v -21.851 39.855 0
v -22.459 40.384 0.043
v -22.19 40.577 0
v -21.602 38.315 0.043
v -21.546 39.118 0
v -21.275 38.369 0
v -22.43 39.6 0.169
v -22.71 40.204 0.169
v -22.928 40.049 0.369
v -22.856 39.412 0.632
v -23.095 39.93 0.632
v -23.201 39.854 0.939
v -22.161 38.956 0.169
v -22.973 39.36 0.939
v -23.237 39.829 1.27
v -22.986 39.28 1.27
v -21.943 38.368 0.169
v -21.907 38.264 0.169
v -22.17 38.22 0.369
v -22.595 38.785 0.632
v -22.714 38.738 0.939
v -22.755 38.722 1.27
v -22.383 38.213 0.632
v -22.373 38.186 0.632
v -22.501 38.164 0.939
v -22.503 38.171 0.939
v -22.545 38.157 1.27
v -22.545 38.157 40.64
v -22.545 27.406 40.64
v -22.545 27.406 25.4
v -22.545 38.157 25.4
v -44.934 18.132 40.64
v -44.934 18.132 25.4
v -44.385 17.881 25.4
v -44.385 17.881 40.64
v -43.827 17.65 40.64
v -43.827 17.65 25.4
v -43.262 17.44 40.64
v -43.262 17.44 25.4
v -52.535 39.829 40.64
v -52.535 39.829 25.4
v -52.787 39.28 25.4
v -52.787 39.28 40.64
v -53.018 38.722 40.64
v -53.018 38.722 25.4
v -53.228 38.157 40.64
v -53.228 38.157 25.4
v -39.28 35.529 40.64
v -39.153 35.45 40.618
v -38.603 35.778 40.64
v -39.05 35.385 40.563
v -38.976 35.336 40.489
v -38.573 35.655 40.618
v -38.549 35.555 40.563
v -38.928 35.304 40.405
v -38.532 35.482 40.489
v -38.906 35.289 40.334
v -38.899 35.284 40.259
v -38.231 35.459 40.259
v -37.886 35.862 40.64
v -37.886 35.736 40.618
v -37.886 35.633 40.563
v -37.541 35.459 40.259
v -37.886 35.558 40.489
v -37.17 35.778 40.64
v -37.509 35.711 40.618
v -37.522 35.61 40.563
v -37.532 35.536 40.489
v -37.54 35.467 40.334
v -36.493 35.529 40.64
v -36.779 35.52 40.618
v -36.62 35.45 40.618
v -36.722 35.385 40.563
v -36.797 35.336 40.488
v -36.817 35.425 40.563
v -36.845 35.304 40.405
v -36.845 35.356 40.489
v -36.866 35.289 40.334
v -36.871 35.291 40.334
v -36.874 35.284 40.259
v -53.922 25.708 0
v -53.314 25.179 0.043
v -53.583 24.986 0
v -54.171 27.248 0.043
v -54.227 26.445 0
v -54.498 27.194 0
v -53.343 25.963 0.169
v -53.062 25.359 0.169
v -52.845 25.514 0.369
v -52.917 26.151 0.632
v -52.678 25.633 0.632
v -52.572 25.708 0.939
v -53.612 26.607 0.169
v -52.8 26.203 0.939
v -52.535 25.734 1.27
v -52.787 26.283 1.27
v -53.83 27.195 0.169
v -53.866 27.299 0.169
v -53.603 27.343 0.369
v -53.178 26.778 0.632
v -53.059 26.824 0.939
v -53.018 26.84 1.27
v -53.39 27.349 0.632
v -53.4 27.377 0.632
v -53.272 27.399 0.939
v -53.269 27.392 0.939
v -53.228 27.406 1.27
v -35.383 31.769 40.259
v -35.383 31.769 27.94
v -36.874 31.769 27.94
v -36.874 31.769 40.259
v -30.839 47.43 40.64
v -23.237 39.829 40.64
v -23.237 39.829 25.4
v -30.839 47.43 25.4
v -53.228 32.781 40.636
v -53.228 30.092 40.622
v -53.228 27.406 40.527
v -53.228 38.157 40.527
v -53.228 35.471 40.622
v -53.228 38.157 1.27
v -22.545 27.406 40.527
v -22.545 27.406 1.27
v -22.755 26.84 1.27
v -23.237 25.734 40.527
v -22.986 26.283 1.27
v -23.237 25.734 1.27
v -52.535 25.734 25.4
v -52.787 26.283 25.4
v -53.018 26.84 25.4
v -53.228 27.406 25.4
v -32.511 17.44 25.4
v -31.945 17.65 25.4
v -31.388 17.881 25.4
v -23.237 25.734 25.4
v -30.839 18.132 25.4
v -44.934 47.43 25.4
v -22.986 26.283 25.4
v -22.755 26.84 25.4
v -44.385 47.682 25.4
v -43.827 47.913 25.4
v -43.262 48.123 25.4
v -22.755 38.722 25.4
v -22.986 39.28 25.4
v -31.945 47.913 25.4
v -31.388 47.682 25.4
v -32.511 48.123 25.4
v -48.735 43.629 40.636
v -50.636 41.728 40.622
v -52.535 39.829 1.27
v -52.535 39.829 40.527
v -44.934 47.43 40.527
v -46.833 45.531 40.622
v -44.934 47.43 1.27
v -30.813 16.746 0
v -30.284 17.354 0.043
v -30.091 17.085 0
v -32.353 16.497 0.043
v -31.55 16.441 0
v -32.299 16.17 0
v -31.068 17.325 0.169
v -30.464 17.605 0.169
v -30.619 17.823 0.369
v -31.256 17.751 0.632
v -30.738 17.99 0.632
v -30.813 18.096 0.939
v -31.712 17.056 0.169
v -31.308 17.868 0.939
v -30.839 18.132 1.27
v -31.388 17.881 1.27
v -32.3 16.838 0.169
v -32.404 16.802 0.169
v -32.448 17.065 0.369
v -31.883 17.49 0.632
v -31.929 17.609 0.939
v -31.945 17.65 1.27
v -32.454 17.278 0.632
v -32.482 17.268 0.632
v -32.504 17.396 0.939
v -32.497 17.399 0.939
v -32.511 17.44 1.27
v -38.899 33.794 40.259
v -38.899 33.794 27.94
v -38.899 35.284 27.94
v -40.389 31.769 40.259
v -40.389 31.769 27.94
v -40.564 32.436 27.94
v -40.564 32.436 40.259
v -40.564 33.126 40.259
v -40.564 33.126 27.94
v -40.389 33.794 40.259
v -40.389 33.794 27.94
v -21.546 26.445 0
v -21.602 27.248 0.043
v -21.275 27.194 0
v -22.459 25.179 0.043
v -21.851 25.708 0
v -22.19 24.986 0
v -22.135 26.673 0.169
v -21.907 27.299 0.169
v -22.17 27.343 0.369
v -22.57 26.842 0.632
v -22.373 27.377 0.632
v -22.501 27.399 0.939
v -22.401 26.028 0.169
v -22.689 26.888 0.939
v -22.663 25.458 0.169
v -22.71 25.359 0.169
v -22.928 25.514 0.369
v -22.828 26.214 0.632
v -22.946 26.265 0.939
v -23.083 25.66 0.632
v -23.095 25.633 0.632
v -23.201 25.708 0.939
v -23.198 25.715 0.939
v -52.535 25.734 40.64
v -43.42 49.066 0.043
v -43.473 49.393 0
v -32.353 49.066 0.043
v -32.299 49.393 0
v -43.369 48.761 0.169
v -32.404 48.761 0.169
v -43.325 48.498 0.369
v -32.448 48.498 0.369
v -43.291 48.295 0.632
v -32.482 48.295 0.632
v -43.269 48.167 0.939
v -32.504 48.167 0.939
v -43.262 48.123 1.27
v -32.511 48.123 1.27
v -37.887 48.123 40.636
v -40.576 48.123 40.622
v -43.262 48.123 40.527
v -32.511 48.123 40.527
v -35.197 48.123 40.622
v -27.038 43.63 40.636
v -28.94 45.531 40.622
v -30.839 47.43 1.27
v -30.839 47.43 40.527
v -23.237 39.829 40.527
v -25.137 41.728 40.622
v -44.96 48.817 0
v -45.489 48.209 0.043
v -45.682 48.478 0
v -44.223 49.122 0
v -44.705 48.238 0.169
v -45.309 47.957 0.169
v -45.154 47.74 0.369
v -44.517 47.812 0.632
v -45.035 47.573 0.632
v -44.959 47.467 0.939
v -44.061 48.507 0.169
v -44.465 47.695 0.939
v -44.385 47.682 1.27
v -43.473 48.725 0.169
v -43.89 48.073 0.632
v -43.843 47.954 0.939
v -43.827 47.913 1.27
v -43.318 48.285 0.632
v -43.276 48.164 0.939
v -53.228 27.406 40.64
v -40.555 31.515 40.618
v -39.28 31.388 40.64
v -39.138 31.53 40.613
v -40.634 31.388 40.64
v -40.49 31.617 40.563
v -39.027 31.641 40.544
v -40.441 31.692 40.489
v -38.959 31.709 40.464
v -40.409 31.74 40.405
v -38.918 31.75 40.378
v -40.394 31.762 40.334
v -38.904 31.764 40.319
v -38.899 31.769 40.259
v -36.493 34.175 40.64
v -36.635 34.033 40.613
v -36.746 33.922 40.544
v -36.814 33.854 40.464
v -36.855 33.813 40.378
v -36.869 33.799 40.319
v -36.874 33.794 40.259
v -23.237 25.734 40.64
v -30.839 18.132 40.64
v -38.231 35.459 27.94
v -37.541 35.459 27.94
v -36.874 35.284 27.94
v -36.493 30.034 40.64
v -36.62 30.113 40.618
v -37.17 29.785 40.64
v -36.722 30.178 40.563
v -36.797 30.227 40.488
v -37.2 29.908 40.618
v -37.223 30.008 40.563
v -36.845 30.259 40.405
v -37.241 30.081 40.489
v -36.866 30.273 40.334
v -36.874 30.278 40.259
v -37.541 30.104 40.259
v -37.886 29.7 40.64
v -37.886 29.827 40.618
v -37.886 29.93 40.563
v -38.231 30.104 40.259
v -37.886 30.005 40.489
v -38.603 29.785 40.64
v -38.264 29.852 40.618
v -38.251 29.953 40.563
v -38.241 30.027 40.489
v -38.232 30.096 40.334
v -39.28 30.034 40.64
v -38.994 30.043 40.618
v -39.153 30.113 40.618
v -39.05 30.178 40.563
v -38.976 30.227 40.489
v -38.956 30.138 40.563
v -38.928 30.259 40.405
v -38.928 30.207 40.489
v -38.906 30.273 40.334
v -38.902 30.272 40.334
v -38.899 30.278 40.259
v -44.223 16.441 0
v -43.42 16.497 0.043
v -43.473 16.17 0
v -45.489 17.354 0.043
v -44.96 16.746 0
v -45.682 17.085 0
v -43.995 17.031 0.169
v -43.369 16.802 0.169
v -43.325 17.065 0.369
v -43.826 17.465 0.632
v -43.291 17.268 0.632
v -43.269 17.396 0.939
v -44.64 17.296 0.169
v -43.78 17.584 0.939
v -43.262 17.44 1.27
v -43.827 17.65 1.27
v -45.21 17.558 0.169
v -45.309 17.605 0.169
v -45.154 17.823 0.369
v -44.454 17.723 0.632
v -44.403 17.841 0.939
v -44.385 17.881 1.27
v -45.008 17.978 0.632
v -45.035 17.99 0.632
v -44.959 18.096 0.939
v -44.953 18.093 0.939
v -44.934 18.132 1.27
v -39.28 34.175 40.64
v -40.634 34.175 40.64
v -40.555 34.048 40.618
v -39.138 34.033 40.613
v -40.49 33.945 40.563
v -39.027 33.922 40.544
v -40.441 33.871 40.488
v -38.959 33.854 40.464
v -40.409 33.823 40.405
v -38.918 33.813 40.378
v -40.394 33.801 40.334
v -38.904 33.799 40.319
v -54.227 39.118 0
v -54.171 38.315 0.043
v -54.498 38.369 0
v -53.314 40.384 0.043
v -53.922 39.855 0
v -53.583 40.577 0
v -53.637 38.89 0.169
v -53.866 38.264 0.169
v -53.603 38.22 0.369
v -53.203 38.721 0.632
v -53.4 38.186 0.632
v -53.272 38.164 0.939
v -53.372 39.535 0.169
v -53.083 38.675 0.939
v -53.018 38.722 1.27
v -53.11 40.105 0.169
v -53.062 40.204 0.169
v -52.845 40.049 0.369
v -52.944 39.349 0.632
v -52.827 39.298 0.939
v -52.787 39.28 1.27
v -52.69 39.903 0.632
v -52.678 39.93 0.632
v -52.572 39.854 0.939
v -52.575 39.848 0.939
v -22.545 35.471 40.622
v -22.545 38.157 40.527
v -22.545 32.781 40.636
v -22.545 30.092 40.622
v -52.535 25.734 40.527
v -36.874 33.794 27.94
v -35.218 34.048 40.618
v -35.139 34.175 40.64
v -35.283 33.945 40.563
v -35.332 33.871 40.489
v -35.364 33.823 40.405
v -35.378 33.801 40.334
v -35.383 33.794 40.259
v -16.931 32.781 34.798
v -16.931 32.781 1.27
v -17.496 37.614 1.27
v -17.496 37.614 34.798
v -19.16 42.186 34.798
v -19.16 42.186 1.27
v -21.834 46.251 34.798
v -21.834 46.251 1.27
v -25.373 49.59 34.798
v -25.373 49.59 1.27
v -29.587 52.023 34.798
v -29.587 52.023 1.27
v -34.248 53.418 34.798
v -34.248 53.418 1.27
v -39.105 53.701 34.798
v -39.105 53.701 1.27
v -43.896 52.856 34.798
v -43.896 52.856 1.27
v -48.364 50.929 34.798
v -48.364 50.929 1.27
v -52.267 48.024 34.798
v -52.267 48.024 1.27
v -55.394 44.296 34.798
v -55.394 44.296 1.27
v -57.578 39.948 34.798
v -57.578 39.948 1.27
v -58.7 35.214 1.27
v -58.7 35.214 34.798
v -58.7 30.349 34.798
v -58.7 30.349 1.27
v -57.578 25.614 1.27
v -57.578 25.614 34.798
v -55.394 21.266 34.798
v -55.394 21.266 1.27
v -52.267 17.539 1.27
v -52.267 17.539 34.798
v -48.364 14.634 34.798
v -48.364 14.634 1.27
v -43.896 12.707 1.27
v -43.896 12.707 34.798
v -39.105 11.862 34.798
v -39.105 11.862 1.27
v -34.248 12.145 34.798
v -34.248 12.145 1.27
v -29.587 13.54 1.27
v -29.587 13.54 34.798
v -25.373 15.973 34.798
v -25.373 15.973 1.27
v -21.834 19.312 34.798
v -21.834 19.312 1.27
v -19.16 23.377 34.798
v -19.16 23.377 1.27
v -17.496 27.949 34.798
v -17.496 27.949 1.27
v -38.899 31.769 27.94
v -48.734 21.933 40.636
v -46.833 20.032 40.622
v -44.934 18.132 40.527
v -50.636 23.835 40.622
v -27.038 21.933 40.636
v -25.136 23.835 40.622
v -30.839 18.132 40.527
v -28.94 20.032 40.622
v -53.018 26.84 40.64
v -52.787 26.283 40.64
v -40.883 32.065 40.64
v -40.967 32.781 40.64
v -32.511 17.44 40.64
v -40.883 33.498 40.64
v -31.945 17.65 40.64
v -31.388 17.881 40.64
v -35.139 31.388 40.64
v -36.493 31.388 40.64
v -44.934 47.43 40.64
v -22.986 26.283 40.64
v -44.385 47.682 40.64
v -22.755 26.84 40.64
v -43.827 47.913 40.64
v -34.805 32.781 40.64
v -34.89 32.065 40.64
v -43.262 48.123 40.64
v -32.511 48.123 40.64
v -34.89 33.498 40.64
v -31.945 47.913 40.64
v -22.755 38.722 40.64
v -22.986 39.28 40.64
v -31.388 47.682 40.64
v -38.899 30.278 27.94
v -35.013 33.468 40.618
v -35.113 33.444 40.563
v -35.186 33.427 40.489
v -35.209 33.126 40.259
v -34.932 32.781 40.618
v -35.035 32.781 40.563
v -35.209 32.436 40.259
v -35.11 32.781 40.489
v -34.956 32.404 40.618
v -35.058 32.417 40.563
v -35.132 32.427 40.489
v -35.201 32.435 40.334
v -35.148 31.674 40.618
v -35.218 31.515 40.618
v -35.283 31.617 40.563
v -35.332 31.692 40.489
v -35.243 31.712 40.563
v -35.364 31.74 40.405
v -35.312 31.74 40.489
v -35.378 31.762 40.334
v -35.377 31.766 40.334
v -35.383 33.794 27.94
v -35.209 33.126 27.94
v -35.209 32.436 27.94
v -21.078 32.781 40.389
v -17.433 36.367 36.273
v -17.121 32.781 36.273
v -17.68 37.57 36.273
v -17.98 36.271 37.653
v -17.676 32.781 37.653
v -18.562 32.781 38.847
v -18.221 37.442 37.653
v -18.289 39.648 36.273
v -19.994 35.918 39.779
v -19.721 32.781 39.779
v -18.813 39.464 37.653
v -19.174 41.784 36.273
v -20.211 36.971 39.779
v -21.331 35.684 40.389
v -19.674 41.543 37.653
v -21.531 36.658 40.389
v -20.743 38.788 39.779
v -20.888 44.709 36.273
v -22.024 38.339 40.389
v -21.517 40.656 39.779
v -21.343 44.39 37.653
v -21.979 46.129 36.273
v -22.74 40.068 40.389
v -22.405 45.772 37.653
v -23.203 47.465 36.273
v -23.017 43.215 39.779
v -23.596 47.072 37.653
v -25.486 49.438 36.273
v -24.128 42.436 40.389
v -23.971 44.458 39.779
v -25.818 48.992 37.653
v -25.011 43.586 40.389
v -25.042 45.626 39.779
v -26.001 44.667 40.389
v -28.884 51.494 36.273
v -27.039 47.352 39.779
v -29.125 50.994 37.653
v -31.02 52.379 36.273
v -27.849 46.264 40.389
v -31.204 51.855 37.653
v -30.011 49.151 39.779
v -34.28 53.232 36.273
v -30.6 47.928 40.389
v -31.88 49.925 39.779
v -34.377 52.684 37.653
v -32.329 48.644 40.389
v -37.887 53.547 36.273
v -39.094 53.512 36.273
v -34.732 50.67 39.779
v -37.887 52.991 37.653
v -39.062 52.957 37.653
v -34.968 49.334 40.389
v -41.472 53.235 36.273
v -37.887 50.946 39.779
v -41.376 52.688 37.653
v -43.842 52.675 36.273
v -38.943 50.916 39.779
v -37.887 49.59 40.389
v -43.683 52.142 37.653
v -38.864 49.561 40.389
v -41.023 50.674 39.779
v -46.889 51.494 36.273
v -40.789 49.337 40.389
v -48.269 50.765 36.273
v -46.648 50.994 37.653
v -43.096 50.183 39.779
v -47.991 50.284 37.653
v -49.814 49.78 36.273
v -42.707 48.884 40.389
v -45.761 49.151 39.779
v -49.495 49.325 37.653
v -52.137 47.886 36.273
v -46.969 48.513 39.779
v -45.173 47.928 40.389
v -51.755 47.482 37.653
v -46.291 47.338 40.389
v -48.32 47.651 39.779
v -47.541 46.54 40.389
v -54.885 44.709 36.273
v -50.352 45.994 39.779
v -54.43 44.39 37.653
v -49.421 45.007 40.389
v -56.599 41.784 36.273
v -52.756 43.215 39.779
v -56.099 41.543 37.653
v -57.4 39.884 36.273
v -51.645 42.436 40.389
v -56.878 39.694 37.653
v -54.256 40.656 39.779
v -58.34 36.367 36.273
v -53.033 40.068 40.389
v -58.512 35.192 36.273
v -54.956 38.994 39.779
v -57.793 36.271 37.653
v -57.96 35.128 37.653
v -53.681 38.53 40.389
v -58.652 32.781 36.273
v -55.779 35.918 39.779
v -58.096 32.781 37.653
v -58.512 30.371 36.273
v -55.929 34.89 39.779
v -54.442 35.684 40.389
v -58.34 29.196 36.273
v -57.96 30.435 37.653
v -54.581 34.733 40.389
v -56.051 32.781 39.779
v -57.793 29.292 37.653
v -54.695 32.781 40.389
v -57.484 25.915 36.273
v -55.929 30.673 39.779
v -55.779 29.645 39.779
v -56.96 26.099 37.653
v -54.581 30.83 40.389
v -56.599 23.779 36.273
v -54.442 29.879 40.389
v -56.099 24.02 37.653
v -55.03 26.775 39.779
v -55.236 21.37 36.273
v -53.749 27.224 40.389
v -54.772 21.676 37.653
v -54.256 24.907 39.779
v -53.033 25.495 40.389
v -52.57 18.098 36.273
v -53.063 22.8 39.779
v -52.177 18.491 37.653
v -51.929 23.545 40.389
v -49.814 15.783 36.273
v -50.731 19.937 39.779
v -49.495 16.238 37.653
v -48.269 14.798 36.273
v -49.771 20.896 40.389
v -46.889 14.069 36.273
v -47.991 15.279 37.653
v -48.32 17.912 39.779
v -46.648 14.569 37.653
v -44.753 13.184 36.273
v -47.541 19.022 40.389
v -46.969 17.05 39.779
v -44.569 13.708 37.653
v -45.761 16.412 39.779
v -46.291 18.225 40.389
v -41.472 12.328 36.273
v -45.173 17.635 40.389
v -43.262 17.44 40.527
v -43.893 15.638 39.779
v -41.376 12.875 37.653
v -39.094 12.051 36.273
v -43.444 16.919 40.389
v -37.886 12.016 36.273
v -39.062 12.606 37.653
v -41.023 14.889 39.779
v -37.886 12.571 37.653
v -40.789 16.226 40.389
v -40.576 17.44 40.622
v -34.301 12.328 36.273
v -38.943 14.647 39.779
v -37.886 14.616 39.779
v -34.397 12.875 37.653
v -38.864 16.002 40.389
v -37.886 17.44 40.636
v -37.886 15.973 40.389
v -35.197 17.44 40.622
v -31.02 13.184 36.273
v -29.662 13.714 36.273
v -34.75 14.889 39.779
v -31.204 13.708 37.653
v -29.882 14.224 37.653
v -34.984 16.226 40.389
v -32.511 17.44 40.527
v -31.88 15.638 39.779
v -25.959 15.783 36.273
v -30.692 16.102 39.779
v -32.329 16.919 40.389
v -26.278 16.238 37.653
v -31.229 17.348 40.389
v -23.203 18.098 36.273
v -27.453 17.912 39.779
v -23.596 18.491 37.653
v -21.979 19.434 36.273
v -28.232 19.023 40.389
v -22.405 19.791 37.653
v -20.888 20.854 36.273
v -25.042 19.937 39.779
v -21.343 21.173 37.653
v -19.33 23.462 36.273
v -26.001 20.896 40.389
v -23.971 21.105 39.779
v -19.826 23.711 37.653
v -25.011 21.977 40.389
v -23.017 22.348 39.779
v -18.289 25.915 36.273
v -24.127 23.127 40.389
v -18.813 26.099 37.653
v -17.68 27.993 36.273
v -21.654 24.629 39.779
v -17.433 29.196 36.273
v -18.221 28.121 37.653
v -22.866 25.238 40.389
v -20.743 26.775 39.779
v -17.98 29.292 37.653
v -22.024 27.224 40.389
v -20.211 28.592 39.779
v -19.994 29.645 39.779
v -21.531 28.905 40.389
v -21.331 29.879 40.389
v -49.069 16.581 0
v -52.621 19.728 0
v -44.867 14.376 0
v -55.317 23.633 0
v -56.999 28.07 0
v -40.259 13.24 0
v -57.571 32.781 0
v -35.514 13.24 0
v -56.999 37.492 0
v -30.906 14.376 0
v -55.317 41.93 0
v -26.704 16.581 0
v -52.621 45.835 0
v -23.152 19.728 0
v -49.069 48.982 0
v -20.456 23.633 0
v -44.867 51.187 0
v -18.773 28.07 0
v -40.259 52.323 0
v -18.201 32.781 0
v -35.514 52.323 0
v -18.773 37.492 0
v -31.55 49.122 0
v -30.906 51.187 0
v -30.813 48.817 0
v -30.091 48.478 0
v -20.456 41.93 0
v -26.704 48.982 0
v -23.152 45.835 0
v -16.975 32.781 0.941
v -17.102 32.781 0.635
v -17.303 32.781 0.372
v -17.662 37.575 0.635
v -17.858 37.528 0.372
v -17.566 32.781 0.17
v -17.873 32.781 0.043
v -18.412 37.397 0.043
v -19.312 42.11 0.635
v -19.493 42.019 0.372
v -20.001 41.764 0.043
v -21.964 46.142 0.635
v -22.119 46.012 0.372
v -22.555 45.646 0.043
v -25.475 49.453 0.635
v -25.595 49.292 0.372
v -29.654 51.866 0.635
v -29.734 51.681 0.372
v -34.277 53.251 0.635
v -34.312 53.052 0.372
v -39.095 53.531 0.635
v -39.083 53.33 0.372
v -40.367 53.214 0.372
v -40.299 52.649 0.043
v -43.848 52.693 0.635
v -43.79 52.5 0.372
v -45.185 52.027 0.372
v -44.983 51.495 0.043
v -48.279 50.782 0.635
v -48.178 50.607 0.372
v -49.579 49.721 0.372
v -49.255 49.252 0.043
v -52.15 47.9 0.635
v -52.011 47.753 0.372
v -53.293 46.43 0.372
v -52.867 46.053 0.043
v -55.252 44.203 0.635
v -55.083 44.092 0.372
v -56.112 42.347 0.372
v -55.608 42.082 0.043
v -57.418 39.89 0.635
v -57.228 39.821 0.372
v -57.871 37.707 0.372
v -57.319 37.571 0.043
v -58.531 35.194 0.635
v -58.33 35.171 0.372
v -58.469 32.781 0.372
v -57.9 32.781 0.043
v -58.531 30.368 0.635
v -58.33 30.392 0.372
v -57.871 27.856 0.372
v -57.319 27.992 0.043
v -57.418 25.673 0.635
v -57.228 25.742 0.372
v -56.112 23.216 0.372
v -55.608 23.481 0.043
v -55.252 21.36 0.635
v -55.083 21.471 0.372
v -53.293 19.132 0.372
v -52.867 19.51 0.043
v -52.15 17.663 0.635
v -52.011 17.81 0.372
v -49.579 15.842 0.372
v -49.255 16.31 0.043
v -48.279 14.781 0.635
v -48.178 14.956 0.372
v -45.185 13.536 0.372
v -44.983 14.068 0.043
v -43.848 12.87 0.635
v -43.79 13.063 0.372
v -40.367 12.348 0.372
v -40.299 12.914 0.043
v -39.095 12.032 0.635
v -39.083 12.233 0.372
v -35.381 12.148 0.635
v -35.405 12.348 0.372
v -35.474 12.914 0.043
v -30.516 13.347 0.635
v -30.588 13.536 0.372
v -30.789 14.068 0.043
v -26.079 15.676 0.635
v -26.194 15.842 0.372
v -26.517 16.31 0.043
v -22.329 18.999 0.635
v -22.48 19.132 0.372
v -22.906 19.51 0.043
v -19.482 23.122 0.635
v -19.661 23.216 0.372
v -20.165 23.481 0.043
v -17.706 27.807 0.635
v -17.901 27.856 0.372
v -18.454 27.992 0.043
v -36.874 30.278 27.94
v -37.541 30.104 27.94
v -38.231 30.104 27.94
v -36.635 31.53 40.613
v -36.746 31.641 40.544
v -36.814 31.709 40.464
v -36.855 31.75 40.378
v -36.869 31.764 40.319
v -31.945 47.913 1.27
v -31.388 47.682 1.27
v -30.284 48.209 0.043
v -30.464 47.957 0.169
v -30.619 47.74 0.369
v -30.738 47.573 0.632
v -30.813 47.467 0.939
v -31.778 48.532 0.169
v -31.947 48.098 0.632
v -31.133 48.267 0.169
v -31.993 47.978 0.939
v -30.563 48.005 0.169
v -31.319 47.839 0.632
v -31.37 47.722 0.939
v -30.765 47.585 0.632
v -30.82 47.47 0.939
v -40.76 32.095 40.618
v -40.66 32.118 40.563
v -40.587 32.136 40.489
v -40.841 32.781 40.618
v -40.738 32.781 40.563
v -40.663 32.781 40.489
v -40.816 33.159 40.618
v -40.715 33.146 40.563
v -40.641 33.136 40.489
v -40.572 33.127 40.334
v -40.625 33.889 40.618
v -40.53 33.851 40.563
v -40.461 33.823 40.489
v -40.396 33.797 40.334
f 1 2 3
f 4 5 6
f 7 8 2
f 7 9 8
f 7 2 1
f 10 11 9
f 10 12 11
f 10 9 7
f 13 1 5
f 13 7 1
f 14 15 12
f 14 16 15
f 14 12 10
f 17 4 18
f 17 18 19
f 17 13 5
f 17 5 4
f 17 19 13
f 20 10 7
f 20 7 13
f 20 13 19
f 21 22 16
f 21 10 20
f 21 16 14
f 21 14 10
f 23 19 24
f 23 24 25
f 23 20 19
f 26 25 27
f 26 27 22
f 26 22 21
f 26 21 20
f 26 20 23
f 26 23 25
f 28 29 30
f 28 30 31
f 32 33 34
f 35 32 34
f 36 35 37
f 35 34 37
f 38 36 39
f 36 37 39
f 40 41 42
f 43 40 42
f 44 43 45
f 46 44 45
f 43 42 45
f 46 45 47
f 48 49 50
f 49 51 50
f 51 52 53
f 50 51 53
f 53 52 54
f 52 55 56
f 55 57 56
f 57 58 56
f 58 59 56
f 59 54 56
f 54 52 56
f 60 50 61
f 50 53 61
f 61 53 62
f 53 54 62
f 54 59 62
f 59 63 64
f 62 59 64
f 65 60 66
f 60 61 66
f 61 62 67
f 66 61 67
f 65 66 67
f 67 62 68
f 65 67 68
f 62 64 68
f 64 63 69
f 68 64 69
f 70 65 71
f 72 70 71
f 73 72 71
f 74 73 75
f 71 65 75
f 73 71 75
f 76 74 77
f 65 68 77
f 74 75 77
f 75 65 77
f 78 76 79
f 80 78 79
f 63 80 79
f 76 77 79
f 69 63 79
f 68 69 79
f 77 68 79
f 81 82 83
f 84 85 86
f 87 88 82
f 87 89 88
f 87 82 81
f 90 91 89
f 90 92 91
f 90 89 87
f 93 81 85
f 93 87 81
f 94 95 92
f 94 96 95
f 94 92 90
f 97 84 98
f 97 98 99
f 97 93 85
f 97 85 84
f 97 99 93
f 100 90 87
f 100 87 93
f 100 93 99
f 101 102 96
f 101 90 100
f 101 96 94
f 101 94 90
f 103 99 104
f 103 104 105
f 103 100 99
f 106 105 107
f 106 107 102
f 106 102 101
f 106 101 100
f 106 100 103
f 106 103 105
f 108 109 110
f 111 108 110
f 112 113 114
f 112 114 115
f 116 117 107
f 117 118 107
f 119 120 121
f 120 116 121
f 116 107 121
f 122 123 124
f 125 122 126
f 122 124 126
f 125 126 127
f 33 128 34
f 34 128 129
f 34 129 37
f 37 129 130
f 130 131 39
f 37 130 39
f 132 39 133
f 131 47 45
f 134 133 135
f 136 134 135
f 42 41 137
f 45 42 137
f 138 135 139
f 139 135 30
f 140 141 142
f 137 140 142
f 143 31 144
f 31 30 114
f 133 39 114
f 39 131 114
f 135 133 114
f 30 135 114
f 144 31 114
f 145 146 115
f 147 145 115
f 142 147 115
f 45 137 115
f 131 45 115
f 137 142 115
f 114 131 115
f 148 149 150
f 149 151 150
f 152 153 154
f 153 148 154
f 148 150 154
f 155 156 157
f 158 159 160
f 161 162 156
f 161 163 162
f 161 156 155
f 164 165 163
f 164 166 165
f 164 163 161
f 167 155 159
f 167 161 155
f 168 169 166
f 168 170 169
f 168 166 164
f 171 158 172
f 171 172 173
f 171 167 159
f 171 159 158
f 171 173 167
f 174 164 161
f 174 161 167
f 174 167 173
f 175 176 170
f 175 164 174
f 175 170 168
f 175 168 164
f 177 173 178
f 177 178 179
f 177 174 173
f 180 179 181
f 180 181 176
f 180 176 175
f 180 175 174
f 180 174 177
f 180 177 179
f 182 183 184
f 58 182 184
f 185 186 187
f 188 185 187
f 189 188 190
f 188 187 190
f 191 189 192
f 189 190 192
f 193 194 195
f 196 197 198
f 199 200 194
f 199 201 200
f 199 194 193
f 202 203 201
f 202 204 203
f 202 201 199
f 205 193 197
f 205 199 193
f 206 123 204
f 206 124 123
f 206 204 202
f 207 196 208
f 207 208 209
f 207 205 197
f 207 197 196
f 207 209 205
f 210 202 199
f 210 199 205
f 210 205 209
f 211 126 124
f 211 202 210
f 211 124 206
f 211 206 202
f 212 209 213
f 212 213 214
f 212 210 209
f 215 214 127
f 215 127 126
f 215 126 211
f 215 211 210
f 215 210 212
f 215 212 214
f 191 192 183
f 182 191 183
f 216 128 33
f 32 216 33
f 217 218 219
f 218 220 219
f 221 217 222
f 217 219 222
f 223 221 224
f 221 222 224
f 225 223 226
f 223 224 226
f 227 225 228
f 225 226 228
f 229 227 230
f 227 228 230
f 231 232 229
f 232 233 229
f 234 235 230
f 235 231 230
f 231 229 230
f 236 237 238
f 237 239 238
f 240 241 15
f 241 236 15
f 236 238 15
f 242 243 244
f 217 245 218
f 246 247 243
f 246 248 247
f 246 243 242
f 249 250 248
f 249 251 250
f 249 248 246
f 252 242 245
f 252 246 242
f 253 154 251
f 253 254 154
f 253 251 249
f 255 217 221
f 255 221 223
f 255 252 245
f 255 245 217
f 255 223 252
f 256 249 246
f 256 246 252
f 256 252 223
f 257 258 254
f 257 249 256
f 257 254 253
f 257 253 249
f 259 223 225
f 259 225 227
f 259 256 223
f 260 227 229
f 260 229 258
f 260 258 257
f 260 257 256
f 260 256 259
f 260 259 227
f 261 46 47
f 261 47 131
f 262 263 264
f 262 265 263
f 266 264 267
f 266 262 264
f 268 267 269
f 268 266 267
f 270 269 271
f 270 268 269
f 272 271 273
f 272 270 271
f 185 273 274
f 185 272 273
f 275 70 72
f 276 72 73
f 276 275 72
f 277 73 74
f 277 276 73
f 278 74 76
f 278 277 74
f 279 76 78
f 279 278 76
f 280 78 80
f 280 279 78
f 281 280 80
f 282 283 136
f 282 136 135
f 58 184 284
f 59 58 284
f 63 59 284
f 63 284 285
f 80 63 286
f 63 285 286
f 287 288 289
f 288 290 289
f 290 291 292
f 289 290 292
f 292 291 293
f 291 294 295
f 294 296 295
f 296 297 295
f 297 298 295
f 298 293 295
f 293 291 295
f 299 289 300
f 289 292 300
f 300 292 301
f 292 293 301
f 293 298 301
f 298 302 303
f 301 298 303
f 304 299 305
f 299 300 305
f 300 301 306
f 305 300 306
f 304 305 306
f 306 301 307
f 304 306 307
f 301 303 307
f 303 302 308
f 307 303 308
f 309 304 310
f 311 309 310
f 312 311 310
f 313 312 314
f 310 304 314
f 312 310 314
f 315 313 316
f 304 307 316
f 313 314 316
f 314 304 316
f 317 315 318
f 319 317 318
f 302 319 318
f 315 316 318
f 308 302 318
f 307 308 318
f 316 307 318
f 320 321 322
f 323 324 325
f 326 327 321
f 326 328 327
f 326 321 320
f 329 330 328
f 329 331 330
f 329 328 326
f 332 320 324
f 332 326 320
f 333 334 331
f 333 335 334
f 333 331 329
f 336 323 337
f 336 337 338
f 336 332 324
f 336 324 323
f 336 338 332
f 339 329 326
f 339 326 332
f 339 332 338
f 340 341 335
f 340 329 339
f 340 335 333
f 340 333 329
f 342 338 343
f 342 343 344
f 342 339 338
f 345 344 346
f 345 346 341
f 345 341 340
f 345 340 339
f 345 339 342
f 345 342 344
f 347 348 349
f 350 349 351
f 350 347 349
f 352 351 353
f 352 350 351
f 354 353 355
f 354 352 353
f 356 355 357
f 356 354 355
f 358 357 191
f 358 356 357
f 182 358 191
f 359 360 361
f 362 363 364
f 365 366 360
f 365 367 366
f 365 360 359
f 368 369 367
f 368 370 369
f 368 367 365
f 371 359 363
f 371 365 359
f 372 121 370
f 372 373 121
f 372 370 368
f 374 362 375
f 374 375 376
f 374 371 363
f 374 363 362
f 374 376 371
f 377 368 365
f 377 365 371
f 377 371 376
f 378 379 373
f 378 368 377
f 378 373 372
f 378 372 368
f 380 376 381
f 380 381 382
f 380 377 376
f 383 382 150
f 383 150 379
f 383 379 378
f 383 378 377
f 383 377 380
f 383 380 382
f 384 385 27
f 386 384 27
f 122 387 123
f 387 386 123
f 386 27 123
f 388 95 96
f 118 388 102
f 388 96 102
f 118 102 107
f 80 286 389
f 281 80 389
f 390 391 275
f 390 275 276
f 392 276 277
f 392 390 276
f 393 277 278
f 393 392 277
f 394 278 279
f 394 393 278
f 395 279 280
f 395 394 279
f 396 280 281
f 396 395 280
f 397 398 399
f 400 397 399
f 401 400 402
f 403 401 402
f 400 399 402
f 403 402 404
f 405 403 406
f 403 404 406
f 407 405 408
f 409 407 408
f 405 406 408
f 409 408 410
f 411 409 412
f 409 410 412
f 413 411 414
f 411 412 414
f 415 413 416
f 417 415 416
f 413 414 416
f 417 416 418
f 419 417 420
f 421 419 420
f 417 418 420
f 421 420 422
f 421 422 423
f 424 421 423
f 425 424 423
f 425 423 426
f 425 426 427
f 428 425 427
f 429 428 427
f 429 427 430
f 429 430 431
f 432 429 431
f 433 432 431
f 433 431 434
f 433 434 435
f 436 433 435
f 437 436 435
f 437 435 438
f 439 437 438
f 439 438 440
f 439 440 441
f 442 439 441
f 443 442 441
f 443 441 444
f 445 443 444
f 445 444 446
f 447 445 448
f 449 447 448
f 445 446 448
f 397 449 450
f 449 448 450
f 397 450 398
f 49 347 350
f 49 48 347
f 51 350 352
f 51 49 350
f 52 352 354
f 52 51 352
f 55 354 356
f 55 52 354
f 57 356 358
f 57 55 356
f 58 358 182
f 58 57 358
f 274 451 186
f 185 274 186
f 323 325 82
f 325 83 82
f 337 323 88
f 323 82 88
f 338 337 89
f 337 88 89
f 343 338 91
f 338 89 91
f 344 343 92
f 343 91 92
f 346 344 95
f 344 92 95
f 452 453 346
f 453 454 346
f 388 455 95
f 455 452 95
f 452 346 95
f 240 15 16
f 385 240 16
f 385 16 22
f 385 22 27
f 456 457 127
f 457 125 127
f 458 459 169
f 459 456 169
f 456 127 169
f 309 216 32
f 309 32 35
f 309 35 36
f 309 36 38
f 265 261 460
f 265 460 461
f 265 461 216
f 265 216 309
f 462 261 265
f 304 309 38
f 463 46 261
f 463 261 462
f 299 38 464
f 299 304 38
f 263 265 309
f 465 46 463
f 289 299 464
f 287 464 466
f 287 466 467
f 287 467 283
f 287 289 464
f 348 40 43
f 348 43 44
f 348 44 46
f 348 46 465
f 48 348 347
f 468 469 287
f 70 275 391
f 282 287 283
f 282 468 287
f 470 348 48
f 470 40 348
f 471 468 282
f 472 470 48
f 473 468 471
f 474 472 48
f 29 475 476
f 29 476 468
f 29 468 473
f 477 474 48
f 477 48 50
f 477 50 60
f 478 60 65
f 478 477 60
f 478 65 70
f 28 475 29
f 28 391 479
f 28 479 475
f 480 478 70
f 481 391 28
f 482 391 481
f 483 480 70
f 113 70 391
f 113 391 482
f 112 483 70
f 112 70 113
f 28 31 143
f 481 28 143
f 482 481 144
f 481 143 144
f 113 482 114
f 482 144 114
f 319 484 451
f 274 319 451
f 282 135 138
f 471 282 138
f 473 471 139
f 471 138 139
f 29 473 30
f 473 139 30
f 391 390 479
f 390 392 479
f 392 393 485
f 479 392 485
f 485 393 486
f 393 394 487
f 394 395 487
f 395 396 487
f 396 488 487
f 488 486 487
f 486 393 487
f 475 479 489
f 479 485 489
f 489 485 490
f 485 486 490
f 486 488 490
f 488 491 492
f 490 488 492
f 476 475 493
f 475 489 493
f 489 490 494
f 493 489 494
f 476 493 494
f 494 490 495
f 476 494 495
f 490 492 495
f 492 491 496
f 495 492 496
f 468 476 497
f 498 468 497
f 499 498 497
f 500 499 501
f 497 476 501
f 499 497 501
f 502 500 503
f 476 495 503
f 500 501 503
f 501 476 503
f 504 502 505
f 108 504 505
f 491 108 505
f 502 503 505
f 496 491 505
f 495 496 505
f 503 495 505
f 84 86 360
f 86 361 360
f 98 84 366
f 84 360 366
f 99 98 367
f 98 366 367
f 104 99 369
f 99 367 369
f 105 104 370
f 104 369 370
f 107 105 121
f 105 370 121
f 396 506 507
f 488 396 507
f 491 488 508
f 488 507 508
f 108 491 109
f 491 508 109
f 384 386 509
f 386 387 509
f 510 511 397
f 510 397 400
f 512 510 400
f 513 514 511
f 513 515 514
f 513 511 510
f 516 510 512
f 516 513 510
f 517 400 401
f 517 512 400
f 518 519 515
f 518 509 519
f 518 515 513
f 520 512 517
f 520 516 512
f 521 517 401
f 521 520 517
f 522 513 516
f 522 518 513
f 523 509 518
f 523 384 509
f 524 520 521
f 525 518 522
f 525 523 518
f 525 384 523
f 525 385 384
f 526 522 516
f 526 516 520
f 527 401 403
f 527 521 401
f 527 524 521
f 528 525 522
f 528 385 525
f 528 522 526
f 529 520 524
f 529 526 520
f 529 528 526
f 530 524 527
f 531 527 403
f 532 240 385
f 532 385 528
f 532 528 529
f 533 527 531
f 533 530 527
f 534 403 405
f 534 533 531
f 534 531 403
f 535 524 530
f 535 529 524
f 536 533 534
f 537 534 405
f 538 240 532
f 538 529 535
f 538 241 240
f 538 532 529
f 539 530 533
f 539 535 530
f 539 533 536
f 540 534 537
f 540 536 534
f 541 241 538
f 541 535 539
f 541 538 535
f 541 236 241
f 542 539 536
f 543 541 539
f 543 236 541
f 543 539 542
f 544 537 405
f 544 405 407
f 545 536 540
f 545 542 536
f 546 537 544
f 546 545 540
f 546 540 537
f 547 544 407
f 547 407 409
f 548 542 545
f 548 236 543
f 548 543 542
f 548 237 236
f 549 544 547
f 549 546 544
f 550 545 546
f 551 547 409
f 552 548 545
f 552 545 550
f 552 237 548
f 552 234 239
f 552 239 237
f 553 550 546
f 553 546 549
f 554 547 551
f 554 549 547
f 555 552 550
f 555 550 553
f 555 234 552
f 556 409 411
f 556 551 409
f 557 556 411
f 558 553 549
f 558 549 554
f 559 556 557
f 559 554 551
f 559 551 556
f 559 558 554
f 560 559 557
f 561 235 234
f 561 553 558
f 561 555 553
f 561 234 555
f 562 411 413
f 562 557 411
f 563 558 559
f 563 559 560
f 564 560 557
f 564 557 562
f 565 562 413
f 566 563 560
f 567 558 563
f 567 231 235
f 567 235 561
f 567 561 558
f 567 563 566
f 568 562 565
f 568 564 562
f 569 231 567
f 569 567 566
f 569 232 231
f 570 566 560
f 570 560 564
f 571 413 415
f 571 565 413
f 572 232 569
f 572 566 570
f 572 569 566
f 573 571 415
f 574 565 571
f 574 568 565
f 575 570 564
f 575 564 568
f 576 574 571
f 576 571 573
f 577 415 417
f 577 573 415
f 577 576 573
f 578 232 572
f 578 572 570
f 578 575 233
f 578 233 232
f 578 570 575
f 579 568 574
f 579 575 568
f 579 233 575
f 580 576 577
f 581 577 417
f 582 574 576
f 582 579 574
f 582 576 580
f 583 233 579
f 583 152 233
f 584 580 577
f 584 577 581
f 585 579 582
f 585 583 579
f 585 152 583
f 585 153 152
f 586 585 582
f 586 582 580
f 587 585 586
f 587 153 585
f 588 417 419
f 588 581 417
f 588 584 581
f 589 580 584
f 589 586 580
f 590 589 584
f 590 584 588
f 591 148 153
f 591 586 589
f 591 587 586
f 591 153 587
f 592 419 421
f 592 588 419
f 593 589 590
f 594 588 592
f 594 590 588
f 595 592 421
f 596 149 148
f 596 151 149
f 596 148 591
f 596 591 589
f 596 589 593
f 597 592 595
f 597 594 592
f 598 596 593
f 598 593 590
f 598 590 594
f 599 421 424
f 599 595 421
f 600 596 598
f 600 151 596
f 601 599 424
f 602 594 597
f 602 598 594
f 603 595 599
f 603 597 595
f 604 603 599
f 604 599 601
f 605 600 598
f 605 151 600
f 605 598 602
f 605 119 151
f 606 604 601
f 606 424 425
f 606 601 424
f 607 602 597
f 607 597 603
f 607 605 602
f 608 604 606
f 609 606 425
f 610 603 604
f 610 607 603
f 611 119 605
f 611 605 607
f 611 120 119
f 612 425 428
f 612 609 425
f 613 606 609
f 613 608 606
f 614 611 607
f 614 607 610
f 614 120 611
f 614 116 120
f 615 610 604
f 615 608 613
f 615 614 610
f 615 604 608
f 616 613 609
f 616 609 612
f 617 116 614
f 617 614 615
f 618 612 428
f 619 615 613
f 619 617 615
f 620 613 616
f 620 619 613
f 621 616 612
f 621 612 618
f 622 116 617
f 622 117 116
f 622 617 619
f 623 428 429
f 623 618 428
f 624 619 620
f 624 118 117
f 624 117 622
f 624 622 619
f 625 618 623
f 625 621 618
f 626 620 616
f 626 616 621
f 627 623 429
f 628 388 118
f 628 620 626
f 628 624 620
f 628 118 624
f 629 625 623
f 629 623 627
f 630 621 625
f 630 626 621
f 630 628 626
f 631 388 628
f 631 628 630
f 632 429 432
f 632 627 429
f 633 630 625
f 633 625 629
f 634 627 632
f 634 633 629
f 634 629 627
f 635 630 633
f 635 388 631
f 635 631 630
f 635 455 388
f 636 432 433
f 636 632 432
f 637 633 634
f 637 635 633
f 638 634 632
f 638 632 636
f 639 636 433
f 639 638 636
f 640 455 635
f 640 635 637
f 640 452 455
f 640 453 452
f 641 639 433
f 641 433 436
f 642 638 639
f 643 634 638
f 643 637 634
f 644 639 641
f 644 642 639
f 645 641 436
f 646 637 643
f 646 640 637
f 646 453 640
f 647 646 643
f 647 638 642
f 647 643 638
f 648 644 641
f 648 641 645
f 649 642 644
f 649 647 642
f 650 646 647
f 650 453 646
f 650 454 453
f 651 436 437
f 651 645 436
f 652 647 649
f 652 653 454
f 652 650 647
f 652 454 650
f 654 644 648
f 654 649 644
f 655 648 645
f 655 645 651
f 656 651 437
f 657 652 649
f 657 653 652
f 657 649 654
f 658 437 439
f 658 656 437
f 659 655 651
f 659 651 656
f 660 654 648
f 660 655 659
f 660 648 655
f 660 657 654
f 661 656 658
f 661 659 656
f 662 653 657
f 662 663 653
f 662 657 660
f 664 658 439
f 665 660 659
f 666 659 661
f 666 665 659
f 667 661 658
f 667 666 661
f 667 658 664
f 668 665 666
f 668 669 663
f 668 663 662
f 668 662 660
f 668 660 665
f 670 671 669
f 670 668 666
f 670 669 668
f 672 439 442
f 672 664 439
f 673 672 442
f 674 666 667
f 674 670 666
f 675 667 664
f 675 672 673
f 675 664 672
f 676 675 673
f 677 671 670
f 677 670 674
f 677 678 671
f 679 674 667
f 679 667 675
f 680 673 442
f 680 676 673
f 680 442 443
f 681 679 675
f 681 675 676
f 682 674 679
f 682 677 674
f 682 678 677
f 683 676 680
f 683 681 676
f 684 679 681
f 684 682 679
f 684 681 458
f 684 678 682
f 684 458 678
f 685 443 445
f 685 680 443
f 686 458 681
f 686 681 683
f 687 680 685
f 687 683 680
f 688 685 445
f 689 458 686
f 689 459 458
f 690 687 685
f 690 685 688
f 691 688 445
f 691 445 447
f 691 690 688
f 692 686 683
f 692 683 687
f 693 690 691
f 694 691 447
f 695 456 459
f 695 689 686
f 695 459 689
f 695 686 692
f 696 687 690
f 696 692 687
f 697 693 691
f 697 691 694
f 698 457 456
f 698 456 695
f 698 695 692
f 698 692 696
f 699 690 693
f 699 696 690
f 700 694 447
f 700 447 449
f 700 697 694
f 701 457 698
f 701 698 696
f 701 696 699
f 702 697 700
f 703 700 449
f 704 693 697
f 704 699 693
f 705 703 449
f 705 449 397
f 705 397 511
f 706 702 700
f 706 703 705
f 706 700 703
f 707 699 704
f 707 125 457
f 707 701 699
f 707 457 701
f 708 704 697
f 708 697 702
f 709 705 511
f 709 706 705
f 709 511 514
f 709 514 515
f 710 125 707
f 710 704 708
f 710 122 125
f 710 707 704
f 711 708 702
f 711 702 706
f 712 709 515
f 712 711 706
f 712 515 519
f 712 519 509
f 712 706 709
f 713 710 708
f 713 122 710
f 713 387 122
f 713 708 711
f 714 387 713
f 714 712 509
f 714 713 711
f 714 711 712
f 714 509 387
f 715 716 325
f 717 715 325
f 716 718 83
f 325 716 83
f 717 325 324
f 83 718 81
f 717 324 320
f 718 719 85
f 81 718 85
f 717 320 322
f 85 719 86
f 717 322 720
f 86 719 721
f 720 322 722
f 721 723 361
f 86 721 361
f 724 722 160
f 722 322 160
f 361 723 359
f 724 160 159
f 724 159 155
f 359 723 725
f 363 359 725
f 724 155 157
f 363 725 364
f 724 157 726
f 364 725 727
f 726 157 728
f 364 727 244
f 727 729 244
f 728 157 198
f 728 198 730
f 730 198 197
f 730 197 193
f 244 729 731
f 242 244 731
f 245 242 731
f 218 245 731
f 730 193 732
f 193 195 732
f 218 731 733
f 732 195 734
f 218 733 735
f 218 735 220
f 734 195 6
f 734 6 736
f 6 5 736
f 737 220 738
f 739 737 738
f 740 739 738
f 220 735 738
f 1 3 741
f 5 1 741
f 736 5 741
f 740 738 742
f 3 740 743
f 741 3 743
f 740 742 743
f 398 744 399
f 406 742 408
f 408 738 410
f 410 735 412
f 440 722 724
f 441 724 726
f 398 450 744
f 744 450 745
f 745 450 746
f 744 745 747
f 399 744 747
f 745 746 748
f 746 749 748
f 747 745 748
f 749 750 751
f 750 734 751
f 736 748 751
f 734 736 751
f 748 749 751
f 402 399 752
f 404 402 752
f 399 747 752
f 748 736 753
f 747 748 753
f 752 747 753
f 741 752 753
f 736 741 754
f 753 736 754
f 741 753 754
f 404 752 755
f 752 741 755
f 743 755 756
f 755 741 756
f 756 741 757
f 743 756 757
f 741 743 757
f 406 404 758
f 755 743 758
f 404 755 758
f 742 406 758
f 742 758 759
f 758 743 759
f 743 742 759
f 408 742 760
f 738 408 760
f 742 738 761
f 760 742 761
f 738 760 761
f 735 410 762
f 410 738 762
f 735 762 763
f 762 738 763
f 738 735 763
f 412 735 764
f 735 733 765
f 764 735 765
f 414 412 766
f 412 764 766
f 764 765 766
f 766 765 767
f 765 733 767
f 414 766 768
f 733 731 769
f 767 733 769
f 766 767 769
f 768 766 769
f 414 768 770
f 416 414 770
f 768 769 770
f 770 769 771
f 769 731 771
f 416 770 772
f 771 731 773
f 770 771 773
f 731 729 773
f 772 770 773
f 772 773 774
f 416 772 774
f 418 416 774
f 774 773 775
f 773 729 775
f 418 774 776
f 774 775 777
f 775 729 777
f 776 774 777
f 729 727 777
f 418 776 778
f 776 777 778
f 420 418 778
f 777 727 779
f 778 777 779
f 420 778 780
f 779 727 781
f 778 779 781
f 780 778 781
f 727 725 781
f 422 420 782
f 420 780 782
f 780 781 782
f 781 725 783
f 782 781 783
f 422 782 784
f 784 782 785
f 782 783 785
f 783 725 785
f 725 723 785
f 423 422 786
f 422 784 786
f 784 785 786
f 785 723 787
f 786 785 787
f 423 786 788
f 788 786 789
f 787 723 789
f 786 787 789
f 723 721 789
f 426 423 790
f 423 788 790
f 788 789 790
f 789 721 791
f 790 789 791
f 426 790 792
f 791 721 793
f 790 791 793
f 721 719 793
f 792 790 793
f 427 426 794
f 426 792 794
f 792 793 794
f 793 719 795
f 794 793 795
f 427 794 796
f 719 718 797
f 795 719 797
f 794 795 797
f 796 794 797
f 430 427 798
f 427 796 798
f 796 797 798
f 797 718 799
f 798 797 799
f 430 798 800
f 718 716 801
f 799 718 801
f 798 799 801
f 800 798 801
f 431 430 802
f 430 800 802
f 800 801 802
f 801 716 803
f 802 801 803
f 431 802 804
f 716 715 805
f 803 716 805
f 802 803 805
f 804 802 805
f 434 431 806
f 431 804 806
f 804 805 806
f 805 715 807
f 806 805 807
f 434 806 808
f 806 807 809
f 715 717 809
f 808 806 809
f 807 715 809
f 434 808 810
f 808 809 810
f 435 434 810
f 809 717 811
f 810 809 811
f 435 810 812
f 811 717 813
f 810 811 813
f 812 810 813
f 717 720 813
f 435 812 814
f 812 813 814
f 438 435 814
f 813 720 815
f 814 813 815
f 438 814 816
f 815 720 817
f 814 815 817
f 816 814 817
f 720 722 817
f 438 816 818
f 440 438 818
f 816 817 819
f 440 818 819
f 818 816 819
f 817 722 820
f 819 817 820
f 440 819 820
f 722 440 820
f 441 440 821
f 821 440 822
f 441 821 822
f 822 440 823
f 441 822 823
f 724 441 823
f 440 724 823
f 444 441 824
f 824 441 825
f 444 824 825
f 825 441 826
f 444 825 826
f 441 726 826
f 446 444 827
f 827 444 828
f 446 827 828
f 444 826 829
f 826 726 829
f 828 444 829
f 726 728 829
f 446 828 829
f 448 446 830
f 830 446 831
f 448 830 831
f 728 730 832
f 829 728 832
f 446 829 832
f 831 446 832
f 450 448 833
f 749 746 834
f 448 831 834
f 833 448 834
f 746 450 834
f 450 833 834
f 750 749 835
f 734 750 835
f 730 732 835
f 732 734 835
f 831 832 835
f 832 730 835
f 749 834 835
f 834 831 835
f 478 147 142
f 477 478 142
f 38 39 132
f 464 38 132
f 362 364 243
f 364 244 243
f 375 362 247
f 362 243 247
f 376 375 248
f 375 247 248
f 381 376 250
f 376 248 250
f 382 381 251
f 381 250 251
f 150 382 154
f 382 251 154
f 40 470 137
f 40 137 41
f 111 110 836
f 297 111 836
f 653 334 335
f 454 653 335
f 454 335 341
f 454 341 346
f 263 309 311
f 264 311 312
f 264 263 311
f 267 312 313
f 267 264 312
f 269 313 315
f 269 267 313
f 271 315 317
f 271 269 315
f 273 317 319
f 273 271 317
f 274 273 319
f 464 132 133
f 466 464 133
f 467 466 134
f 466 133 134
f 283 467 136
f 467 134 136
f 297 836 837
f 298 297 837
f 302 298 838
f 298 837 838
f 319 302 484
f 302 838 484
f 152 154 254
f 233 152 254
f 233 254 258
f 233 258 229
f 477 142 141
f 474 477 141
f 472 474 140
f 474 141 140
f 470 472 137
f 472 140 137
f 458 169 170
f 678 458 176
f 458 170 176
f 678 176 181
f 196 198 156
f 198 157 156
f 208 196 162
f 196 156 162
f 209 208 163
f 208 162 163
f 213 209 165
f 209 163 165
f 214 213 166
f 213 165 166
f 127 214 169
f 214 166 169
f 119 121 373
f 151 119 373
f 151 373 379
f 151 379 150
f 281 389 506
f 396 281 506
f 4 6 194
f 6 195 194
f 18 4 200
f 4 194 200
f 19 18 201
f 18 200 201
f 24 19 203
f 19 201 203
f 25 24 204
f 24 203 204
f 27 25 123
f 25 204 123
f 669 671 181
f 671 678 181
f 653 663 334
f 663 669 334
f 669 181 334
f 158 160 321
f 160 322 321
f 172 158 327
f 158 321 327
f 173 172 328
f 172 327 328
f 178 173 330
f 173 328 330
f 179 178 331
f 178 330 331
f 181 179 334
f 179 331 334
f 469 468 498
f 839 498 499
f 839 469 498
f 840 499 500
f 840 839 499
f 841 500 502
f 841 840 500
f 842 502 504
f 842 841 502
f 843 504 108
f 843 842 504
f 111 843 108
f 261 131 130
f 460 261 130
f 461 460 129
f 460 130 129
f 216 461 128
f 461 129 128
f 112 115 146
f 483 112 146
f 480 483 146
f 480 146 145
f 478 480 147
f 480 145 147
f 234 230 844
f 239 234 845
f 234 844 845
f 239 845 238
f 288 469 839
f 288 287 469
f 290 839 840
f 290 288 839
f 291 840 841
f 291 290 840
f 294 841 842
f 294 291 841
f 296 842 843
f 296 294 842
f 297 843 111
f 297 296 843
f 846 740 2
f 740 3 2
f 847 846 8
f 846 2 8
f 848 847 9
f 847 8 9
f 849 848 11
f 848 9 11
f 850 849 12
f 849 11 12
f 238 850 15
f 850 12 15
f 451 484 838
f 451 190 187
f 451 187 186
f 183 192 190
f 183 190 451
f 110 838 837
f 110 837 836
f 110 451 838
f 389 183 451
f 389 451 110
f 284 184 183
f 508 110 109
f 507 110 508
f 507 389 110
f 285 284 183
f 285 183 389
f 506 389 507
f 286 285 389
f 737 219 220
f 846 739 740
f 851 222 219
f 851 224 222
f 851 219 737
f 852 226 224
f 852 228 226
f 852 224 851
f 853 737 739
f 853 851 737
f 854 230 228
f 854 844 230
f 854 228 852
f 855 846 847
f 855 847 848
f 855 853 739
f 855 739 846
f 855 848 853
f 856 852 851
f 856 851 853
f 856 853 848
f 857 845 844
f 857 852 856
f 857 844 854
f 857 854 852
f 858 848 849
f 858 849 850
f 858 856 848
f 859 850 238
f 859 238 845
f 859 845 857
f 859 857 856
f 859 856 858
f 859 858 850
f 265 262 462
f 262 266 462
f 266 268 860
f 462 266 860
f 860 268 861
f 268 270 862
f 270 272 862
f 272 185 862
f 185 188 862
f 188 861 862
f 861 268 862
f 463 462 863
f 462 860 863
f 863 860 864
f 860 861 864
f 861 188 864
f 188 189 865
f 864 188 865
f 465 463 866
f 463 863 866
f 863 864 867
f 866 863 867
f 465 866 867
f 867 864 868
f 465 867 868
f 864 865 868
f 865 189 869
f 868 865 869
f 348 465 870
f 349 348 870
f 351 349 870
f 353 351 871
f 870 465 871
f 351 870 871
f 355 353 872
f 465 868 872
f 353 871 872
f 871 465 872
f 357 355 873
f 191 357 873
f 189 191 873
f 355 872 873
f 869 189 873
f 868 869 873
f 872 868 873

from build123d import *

# Parameters (mm, degrees)
F1_START = 25.4
F1_DEPTH = 2.54
F2_START = 25.4
F0_R     = 6.35
F2_DEPTH = 15.24
F3_START = 25.4
F3_DEPTH = 15.24
F0_R_2   = 20.955
F4_DEPTH = 40.64
F5_R     = 0.381
F7_R     = 1.27


# Not quite as in the source:
# - a fillet or chamfer that OpenCascade refuses, or shapes differently, is made with other operations: its cross-section is extruded or revolved along the edge and cut away or added
# - a feature names something its author has since deleted; it is built from what else it names


with BuildPart() as f1:
    # F0 (on Top) → F1 (new body)
    with BuildSketch(Plane.XY.offset(F1_START)):
        with BuildLine():
            Line((-40.3893615403, 31.7689274535), (-38.8988945509, 31.7689274535))
            Line((-38.8988945509, 31.7689274535), (-38.8988945509, 30.2784604641))
            ThreePointArc((-38.8988945509, 30.2784604641), (-37.8863945509, 30.0814274535), (-36.8738945509, 30.2784604641))
            Line((-36.8738945509, 30.2784604641), (-36.8738945509, 31.7689274535))
            Line((-36.8738945509, 31.7689274535), (-35.3834275615, 31.7689274535))
            ThreePointArc((-35.3834275615, 31.7689274535), (-35.1863945509, 32.7814274535), (-35.3834275615, 33.7939274535))
            Line((-35.3834275615, 33.7939274535), (-36.8738945509, 33.7939274535))
            Line((-36.8738945509, 33.7939274535), (-36.8738945509, 35.2843944429))
            ThreePointArc((-36.8738945509, 35.2843944429), (-37.8863945509, 35.4814274535), (-38.8988945509, 35.2843944429))
            Line((-38.8988945509, 35.2843944429), (-38.8988945509, 33.7939274535))
            Line((-38.8988945509, 33.7939274535), (-40.3893615403, 33.7939274535))
            ThreePointArc((-40.3893615403, 33.7939274535), (-40.5863945509, 32.7814274535), (-40.3893615403, 31.7689274535))
        make_face()
    extrude(amount=F1_DEPTH)

    # F0 (on Top) → F2 (join)
    with BuildSketch(Plane.XY.offset(F2_START)):
        with Locations((-37.8863945509, 32.7814274535)):
            Circle(F0_R)
        with BuildLine():
            Line((-38.8988945509, 30.2784604641), (-38.8988945509, 31.7689274535))
            Line((-38.8988945509, 31.7689274535), (-40.3893615403, 31.7689274535))
            ThreePointArc((-40.3893615403, 31.7689274535), (-40.5863945509, 32.7814274535), (-40.3893615403, 33.7939274535))
            Line((-40.3893615403, 33.7939274535), (-38.8988945509, 33.7939274535))
            Line((-38.8988945509, 33.7939274535), (-38.8988945509, 35.2843944429))
            ThreePointArc((-38.8988945509, 35.2843944429), (-37.8863945509, 35.4814274535), (-36.8738945509, 35.2843944429))
            Line((-36.8738945509, 35.2843944429), (-36.8738945509, 33.7939274535))
            Line((-36.8738945509, 33.7939274535), (-35.3834275615, 33.7939274535))
            ThreePointArc((-35.3834275615, 33.7939274535), (-35.1863945509, 32.7814274535), (-35.3834275615, 31.7689274535))
            Line((-35.3834275615, 31.7689274535), (-36.8738945509, 31.7689274535))
            Line((-36.8738945509, 31.7689274535), (-36.8738945509, 30.2784604641))
            ThreePointArc((-36.8738945509, 30.2784604641), (-37.8863945509, 30.0814274535), (-38.8988945509, 30.2784604641))
        make_face(mode=Mode.SUBTRACT)
    extrude(amount=F2_DEPTH)

    # F0 (on Top) → F3 (join)
    with BuildSketch(Plane.XY.offset(F3_START)):
        with BuildLine():
            Line((-22.5447945509, 27.4062209049), (-22.5447945509, 38.1566340021))
            ThreePointArc((-22.5447945509, 38.1566340021), (-22.8678088704, 39.00232933), (-23.2374001559, 39.8287318469))
            Line((-23.2374001559, 39.8287318469), (-30.8390901575, 47.4304218485))
            ThreePointArc((-30.8390901575, 47.4304218485), (-31.6654926744, 47.800013134), (-32.5111880023, 48.1230274535))
            Line((-32.5111880023, 48.1230274535), (-43.2616010995, 48.1230274535))
            ThreePointArc((-43.2616010995, 48.1230274535), (-44.1072964275, 47.800013134), (-44.9336989444, 47.4304218485))
            Line((-44.9336989444, 47.4304218485), (-52.535388946, 39.8287318469))
            ThreePointArc((-52.535388946, 39.8287318469), (-52.9049802314, 39.00232933), (-53.2279945509, 38.1566340021))
            Line((-53.2279945509, 38.1566340021), (-53.2279945509, 27.4062209049))
            ThreePointArc((-53.2279945509, 27.4062209049), (-52.9049802314, 26.5605255769), (-52.535388946, 25.73412306))
            Line((-52.535388946, 25.73412306), (-44.9336989444, 18.1324330584))
            ThreePointArc((-44.9336989444, 18.1324330584), (-44.1072964275, 17.762841773), (-43.2616010995, 17.4398274535))
            Line((-43.2616010995, 17.4398274535), (-32.5111880023, 17.4398274535))
            ThreePointArc((-32.5111880023, 17.4398274535), (-31.6654926744, 17.762841773), (-30.8390901575, 18.1324330584))
            Line((-30.8390901575, 18.1324330584), (-23.2374001559, 25.73412306))
            ThreePointArc((-23.2374001559, 25.73412306), (-22.8678088704, 26.5605255769), (-22.5447945509, 27.4062209049))
        make_face()
        with Locations((-37.8863945509, 32.7814274535)):
            Circle(F0_R, mode=Mode.SUBTRACT)
    extrude(amount=F3_DEPTH)

    # F5
    f5_edges = [f1.edges().sort_by_distance(p)[0] for p in [
        (-36.128661, 33.793927, 40.64),
        (-35.186395, 32.781427, 40.64),
        (-36.873895, 31.023694, 40.64),
        (-36.873895, 34.539161, 40.64),
        (-37.886395, 35.481427, 40.64),
        (-36.128661, 31.768927, 40.64),
        (-39.644128, 33.793927, 40.64),
        (-38.898895, 34.539161, 40.64),
        (-39.644128, 31.768927, 40.64),
        (-40.586395, 32.781427, 40.64),
        (-38.898895, 31.023694, 40.64),
        (-37.886395, 30.081427, 40.64),
    ]]
    fillet(f5_edges, radius=F5_R)


with BuildPart() as f4:
    # F0 (on Top) → F4 (new body)
    with BuildSketch(Plane.XY):
        with Locations((-37.8863945509, 32.7814274535)):
            Circle(F0_R_2)
        with BuildLine():
            ThreePointArc((-23.2374001559, 39.8287318469), (-22.8678088704, 39.00232933), (-22.5447945509, 38.1566340021))
            Line((-22.5447945509, 38.1566340021), (-22.5447945509, 27.4062209049))
            ThreePointArc((-22.5447945509, 27.4062209049), (-22.8678088704, 26.5605255769), (-23.2374001559, 25.73412306))
            Line((-23.2374001559, 25.73412306), (-30.8390901575, 18.1324330584))
            ThreePointArc((-30.8390901575, 18.1324330584), (-31.6654926744, 17.762841773), (-32.5111880023, 17.4398274535))
            Line((-32.5111880023, 17.4398274535), (-43.2616010995, 17.4398274535))
            ThreePointArc((-43.2616010995, 17.4398274535), (-44.1072964275, 17.762841773), (-44.9336989444, 18.1324330584))
            Line((-44.9336989444, 18.1324330584), (-52.535388946, 25.73412306))
            ThreePointArc((-52.535388946, 25.73412306), (-52.9049802314, 26.5605255769), (-53.2279945509, 27.4062209049))
            Line((-53.2279945509, 27.4062209049), (-53.2279945509, 38.1566340021))
            ThreePointArc((-53.2279945509, 38.1566340021), (-52.9049802314, 39.00232933), (-52.535388946, 39.8287318469))
            Line((-52.535388946, 39.8287318469), (-44.9336989444, 47.4304218485))
            ThreePointArc((-44.9336989444, 47.4304218485), (-44.1072964275, 47.800013134), (-43.2616010995, 48.1230274535))
            Line((-43.2616010995, 48.1230274535), (-32.5111880023, 48.1230274535))
            ThreePointArc((-32.5111880023, 48.1230274535), (-31.6654926744, 47.800013134), (-30.8390901575, 47.4304218485))
            Line((-30.8390901575, 47.4304218485), (-23.2374001559, 39.8287318469))
        make_face(mode=Mode.SUBTRACT)
    extrude(amount=F4_DEPTH)

    # F6: fillet of radius 5.842 on 1 edges, made by hand

    # F6_s1 → F6_t2 (revolve, cut)
    with BuildSketch(Plane.XZ.offset(-32.7814274535)):
        with BuildLine():
            ThreePointArc((-16.9313945509, 34.798), (-18.6424767352, 38.9289178157), (-22.7733945509, 40.64))
            Line((-22.7733945509, 40.64), (-16.9313945509, 40.64))
            Line((-16.9313945509, 40.64), (-16.9313945509, 34.798))
        make_face()
    revolve(axis=Axis((-37.8863945509, 32.7814274535, 40.64), (0, 0, 1)), mode=Mode.SUBTRACT)

    # F7
    f7_edges = [f4.edges().sort_by_distance(p)[0] for p in [
        (-58.841395, 32.781427, 0),
        (-37.886395, 17.439827, 0),
        (-48.734544, 21.933278, 0),
        (-44.107296, 17.762842, 0),
        (-31.665493, 17.762842, 0),
        (-27.038245, 21.933278, 0),
        (-22.867809, 26.560526, 0),
        (-22.544795, 32.781427, 0),
        (-22.867809, 39.002329, 0),
        (-27.038245, 43.629577, 0),
        (-52.90498, 26.560526, 0),
        (-53.227995, 32.781427, 0),
        (-52.90498, 39.002329, 0),
        (-48.734544, 43.629577, 0),
        (-44.107296, 47.800013, 0),
        (-37.886395, 48.123027, 0),
        (-31.665493, 47.800013, 0),
    ]]
    fillet(f7_edges, radius=F7_R)


solid = Compound([f1.part, f4.part])
